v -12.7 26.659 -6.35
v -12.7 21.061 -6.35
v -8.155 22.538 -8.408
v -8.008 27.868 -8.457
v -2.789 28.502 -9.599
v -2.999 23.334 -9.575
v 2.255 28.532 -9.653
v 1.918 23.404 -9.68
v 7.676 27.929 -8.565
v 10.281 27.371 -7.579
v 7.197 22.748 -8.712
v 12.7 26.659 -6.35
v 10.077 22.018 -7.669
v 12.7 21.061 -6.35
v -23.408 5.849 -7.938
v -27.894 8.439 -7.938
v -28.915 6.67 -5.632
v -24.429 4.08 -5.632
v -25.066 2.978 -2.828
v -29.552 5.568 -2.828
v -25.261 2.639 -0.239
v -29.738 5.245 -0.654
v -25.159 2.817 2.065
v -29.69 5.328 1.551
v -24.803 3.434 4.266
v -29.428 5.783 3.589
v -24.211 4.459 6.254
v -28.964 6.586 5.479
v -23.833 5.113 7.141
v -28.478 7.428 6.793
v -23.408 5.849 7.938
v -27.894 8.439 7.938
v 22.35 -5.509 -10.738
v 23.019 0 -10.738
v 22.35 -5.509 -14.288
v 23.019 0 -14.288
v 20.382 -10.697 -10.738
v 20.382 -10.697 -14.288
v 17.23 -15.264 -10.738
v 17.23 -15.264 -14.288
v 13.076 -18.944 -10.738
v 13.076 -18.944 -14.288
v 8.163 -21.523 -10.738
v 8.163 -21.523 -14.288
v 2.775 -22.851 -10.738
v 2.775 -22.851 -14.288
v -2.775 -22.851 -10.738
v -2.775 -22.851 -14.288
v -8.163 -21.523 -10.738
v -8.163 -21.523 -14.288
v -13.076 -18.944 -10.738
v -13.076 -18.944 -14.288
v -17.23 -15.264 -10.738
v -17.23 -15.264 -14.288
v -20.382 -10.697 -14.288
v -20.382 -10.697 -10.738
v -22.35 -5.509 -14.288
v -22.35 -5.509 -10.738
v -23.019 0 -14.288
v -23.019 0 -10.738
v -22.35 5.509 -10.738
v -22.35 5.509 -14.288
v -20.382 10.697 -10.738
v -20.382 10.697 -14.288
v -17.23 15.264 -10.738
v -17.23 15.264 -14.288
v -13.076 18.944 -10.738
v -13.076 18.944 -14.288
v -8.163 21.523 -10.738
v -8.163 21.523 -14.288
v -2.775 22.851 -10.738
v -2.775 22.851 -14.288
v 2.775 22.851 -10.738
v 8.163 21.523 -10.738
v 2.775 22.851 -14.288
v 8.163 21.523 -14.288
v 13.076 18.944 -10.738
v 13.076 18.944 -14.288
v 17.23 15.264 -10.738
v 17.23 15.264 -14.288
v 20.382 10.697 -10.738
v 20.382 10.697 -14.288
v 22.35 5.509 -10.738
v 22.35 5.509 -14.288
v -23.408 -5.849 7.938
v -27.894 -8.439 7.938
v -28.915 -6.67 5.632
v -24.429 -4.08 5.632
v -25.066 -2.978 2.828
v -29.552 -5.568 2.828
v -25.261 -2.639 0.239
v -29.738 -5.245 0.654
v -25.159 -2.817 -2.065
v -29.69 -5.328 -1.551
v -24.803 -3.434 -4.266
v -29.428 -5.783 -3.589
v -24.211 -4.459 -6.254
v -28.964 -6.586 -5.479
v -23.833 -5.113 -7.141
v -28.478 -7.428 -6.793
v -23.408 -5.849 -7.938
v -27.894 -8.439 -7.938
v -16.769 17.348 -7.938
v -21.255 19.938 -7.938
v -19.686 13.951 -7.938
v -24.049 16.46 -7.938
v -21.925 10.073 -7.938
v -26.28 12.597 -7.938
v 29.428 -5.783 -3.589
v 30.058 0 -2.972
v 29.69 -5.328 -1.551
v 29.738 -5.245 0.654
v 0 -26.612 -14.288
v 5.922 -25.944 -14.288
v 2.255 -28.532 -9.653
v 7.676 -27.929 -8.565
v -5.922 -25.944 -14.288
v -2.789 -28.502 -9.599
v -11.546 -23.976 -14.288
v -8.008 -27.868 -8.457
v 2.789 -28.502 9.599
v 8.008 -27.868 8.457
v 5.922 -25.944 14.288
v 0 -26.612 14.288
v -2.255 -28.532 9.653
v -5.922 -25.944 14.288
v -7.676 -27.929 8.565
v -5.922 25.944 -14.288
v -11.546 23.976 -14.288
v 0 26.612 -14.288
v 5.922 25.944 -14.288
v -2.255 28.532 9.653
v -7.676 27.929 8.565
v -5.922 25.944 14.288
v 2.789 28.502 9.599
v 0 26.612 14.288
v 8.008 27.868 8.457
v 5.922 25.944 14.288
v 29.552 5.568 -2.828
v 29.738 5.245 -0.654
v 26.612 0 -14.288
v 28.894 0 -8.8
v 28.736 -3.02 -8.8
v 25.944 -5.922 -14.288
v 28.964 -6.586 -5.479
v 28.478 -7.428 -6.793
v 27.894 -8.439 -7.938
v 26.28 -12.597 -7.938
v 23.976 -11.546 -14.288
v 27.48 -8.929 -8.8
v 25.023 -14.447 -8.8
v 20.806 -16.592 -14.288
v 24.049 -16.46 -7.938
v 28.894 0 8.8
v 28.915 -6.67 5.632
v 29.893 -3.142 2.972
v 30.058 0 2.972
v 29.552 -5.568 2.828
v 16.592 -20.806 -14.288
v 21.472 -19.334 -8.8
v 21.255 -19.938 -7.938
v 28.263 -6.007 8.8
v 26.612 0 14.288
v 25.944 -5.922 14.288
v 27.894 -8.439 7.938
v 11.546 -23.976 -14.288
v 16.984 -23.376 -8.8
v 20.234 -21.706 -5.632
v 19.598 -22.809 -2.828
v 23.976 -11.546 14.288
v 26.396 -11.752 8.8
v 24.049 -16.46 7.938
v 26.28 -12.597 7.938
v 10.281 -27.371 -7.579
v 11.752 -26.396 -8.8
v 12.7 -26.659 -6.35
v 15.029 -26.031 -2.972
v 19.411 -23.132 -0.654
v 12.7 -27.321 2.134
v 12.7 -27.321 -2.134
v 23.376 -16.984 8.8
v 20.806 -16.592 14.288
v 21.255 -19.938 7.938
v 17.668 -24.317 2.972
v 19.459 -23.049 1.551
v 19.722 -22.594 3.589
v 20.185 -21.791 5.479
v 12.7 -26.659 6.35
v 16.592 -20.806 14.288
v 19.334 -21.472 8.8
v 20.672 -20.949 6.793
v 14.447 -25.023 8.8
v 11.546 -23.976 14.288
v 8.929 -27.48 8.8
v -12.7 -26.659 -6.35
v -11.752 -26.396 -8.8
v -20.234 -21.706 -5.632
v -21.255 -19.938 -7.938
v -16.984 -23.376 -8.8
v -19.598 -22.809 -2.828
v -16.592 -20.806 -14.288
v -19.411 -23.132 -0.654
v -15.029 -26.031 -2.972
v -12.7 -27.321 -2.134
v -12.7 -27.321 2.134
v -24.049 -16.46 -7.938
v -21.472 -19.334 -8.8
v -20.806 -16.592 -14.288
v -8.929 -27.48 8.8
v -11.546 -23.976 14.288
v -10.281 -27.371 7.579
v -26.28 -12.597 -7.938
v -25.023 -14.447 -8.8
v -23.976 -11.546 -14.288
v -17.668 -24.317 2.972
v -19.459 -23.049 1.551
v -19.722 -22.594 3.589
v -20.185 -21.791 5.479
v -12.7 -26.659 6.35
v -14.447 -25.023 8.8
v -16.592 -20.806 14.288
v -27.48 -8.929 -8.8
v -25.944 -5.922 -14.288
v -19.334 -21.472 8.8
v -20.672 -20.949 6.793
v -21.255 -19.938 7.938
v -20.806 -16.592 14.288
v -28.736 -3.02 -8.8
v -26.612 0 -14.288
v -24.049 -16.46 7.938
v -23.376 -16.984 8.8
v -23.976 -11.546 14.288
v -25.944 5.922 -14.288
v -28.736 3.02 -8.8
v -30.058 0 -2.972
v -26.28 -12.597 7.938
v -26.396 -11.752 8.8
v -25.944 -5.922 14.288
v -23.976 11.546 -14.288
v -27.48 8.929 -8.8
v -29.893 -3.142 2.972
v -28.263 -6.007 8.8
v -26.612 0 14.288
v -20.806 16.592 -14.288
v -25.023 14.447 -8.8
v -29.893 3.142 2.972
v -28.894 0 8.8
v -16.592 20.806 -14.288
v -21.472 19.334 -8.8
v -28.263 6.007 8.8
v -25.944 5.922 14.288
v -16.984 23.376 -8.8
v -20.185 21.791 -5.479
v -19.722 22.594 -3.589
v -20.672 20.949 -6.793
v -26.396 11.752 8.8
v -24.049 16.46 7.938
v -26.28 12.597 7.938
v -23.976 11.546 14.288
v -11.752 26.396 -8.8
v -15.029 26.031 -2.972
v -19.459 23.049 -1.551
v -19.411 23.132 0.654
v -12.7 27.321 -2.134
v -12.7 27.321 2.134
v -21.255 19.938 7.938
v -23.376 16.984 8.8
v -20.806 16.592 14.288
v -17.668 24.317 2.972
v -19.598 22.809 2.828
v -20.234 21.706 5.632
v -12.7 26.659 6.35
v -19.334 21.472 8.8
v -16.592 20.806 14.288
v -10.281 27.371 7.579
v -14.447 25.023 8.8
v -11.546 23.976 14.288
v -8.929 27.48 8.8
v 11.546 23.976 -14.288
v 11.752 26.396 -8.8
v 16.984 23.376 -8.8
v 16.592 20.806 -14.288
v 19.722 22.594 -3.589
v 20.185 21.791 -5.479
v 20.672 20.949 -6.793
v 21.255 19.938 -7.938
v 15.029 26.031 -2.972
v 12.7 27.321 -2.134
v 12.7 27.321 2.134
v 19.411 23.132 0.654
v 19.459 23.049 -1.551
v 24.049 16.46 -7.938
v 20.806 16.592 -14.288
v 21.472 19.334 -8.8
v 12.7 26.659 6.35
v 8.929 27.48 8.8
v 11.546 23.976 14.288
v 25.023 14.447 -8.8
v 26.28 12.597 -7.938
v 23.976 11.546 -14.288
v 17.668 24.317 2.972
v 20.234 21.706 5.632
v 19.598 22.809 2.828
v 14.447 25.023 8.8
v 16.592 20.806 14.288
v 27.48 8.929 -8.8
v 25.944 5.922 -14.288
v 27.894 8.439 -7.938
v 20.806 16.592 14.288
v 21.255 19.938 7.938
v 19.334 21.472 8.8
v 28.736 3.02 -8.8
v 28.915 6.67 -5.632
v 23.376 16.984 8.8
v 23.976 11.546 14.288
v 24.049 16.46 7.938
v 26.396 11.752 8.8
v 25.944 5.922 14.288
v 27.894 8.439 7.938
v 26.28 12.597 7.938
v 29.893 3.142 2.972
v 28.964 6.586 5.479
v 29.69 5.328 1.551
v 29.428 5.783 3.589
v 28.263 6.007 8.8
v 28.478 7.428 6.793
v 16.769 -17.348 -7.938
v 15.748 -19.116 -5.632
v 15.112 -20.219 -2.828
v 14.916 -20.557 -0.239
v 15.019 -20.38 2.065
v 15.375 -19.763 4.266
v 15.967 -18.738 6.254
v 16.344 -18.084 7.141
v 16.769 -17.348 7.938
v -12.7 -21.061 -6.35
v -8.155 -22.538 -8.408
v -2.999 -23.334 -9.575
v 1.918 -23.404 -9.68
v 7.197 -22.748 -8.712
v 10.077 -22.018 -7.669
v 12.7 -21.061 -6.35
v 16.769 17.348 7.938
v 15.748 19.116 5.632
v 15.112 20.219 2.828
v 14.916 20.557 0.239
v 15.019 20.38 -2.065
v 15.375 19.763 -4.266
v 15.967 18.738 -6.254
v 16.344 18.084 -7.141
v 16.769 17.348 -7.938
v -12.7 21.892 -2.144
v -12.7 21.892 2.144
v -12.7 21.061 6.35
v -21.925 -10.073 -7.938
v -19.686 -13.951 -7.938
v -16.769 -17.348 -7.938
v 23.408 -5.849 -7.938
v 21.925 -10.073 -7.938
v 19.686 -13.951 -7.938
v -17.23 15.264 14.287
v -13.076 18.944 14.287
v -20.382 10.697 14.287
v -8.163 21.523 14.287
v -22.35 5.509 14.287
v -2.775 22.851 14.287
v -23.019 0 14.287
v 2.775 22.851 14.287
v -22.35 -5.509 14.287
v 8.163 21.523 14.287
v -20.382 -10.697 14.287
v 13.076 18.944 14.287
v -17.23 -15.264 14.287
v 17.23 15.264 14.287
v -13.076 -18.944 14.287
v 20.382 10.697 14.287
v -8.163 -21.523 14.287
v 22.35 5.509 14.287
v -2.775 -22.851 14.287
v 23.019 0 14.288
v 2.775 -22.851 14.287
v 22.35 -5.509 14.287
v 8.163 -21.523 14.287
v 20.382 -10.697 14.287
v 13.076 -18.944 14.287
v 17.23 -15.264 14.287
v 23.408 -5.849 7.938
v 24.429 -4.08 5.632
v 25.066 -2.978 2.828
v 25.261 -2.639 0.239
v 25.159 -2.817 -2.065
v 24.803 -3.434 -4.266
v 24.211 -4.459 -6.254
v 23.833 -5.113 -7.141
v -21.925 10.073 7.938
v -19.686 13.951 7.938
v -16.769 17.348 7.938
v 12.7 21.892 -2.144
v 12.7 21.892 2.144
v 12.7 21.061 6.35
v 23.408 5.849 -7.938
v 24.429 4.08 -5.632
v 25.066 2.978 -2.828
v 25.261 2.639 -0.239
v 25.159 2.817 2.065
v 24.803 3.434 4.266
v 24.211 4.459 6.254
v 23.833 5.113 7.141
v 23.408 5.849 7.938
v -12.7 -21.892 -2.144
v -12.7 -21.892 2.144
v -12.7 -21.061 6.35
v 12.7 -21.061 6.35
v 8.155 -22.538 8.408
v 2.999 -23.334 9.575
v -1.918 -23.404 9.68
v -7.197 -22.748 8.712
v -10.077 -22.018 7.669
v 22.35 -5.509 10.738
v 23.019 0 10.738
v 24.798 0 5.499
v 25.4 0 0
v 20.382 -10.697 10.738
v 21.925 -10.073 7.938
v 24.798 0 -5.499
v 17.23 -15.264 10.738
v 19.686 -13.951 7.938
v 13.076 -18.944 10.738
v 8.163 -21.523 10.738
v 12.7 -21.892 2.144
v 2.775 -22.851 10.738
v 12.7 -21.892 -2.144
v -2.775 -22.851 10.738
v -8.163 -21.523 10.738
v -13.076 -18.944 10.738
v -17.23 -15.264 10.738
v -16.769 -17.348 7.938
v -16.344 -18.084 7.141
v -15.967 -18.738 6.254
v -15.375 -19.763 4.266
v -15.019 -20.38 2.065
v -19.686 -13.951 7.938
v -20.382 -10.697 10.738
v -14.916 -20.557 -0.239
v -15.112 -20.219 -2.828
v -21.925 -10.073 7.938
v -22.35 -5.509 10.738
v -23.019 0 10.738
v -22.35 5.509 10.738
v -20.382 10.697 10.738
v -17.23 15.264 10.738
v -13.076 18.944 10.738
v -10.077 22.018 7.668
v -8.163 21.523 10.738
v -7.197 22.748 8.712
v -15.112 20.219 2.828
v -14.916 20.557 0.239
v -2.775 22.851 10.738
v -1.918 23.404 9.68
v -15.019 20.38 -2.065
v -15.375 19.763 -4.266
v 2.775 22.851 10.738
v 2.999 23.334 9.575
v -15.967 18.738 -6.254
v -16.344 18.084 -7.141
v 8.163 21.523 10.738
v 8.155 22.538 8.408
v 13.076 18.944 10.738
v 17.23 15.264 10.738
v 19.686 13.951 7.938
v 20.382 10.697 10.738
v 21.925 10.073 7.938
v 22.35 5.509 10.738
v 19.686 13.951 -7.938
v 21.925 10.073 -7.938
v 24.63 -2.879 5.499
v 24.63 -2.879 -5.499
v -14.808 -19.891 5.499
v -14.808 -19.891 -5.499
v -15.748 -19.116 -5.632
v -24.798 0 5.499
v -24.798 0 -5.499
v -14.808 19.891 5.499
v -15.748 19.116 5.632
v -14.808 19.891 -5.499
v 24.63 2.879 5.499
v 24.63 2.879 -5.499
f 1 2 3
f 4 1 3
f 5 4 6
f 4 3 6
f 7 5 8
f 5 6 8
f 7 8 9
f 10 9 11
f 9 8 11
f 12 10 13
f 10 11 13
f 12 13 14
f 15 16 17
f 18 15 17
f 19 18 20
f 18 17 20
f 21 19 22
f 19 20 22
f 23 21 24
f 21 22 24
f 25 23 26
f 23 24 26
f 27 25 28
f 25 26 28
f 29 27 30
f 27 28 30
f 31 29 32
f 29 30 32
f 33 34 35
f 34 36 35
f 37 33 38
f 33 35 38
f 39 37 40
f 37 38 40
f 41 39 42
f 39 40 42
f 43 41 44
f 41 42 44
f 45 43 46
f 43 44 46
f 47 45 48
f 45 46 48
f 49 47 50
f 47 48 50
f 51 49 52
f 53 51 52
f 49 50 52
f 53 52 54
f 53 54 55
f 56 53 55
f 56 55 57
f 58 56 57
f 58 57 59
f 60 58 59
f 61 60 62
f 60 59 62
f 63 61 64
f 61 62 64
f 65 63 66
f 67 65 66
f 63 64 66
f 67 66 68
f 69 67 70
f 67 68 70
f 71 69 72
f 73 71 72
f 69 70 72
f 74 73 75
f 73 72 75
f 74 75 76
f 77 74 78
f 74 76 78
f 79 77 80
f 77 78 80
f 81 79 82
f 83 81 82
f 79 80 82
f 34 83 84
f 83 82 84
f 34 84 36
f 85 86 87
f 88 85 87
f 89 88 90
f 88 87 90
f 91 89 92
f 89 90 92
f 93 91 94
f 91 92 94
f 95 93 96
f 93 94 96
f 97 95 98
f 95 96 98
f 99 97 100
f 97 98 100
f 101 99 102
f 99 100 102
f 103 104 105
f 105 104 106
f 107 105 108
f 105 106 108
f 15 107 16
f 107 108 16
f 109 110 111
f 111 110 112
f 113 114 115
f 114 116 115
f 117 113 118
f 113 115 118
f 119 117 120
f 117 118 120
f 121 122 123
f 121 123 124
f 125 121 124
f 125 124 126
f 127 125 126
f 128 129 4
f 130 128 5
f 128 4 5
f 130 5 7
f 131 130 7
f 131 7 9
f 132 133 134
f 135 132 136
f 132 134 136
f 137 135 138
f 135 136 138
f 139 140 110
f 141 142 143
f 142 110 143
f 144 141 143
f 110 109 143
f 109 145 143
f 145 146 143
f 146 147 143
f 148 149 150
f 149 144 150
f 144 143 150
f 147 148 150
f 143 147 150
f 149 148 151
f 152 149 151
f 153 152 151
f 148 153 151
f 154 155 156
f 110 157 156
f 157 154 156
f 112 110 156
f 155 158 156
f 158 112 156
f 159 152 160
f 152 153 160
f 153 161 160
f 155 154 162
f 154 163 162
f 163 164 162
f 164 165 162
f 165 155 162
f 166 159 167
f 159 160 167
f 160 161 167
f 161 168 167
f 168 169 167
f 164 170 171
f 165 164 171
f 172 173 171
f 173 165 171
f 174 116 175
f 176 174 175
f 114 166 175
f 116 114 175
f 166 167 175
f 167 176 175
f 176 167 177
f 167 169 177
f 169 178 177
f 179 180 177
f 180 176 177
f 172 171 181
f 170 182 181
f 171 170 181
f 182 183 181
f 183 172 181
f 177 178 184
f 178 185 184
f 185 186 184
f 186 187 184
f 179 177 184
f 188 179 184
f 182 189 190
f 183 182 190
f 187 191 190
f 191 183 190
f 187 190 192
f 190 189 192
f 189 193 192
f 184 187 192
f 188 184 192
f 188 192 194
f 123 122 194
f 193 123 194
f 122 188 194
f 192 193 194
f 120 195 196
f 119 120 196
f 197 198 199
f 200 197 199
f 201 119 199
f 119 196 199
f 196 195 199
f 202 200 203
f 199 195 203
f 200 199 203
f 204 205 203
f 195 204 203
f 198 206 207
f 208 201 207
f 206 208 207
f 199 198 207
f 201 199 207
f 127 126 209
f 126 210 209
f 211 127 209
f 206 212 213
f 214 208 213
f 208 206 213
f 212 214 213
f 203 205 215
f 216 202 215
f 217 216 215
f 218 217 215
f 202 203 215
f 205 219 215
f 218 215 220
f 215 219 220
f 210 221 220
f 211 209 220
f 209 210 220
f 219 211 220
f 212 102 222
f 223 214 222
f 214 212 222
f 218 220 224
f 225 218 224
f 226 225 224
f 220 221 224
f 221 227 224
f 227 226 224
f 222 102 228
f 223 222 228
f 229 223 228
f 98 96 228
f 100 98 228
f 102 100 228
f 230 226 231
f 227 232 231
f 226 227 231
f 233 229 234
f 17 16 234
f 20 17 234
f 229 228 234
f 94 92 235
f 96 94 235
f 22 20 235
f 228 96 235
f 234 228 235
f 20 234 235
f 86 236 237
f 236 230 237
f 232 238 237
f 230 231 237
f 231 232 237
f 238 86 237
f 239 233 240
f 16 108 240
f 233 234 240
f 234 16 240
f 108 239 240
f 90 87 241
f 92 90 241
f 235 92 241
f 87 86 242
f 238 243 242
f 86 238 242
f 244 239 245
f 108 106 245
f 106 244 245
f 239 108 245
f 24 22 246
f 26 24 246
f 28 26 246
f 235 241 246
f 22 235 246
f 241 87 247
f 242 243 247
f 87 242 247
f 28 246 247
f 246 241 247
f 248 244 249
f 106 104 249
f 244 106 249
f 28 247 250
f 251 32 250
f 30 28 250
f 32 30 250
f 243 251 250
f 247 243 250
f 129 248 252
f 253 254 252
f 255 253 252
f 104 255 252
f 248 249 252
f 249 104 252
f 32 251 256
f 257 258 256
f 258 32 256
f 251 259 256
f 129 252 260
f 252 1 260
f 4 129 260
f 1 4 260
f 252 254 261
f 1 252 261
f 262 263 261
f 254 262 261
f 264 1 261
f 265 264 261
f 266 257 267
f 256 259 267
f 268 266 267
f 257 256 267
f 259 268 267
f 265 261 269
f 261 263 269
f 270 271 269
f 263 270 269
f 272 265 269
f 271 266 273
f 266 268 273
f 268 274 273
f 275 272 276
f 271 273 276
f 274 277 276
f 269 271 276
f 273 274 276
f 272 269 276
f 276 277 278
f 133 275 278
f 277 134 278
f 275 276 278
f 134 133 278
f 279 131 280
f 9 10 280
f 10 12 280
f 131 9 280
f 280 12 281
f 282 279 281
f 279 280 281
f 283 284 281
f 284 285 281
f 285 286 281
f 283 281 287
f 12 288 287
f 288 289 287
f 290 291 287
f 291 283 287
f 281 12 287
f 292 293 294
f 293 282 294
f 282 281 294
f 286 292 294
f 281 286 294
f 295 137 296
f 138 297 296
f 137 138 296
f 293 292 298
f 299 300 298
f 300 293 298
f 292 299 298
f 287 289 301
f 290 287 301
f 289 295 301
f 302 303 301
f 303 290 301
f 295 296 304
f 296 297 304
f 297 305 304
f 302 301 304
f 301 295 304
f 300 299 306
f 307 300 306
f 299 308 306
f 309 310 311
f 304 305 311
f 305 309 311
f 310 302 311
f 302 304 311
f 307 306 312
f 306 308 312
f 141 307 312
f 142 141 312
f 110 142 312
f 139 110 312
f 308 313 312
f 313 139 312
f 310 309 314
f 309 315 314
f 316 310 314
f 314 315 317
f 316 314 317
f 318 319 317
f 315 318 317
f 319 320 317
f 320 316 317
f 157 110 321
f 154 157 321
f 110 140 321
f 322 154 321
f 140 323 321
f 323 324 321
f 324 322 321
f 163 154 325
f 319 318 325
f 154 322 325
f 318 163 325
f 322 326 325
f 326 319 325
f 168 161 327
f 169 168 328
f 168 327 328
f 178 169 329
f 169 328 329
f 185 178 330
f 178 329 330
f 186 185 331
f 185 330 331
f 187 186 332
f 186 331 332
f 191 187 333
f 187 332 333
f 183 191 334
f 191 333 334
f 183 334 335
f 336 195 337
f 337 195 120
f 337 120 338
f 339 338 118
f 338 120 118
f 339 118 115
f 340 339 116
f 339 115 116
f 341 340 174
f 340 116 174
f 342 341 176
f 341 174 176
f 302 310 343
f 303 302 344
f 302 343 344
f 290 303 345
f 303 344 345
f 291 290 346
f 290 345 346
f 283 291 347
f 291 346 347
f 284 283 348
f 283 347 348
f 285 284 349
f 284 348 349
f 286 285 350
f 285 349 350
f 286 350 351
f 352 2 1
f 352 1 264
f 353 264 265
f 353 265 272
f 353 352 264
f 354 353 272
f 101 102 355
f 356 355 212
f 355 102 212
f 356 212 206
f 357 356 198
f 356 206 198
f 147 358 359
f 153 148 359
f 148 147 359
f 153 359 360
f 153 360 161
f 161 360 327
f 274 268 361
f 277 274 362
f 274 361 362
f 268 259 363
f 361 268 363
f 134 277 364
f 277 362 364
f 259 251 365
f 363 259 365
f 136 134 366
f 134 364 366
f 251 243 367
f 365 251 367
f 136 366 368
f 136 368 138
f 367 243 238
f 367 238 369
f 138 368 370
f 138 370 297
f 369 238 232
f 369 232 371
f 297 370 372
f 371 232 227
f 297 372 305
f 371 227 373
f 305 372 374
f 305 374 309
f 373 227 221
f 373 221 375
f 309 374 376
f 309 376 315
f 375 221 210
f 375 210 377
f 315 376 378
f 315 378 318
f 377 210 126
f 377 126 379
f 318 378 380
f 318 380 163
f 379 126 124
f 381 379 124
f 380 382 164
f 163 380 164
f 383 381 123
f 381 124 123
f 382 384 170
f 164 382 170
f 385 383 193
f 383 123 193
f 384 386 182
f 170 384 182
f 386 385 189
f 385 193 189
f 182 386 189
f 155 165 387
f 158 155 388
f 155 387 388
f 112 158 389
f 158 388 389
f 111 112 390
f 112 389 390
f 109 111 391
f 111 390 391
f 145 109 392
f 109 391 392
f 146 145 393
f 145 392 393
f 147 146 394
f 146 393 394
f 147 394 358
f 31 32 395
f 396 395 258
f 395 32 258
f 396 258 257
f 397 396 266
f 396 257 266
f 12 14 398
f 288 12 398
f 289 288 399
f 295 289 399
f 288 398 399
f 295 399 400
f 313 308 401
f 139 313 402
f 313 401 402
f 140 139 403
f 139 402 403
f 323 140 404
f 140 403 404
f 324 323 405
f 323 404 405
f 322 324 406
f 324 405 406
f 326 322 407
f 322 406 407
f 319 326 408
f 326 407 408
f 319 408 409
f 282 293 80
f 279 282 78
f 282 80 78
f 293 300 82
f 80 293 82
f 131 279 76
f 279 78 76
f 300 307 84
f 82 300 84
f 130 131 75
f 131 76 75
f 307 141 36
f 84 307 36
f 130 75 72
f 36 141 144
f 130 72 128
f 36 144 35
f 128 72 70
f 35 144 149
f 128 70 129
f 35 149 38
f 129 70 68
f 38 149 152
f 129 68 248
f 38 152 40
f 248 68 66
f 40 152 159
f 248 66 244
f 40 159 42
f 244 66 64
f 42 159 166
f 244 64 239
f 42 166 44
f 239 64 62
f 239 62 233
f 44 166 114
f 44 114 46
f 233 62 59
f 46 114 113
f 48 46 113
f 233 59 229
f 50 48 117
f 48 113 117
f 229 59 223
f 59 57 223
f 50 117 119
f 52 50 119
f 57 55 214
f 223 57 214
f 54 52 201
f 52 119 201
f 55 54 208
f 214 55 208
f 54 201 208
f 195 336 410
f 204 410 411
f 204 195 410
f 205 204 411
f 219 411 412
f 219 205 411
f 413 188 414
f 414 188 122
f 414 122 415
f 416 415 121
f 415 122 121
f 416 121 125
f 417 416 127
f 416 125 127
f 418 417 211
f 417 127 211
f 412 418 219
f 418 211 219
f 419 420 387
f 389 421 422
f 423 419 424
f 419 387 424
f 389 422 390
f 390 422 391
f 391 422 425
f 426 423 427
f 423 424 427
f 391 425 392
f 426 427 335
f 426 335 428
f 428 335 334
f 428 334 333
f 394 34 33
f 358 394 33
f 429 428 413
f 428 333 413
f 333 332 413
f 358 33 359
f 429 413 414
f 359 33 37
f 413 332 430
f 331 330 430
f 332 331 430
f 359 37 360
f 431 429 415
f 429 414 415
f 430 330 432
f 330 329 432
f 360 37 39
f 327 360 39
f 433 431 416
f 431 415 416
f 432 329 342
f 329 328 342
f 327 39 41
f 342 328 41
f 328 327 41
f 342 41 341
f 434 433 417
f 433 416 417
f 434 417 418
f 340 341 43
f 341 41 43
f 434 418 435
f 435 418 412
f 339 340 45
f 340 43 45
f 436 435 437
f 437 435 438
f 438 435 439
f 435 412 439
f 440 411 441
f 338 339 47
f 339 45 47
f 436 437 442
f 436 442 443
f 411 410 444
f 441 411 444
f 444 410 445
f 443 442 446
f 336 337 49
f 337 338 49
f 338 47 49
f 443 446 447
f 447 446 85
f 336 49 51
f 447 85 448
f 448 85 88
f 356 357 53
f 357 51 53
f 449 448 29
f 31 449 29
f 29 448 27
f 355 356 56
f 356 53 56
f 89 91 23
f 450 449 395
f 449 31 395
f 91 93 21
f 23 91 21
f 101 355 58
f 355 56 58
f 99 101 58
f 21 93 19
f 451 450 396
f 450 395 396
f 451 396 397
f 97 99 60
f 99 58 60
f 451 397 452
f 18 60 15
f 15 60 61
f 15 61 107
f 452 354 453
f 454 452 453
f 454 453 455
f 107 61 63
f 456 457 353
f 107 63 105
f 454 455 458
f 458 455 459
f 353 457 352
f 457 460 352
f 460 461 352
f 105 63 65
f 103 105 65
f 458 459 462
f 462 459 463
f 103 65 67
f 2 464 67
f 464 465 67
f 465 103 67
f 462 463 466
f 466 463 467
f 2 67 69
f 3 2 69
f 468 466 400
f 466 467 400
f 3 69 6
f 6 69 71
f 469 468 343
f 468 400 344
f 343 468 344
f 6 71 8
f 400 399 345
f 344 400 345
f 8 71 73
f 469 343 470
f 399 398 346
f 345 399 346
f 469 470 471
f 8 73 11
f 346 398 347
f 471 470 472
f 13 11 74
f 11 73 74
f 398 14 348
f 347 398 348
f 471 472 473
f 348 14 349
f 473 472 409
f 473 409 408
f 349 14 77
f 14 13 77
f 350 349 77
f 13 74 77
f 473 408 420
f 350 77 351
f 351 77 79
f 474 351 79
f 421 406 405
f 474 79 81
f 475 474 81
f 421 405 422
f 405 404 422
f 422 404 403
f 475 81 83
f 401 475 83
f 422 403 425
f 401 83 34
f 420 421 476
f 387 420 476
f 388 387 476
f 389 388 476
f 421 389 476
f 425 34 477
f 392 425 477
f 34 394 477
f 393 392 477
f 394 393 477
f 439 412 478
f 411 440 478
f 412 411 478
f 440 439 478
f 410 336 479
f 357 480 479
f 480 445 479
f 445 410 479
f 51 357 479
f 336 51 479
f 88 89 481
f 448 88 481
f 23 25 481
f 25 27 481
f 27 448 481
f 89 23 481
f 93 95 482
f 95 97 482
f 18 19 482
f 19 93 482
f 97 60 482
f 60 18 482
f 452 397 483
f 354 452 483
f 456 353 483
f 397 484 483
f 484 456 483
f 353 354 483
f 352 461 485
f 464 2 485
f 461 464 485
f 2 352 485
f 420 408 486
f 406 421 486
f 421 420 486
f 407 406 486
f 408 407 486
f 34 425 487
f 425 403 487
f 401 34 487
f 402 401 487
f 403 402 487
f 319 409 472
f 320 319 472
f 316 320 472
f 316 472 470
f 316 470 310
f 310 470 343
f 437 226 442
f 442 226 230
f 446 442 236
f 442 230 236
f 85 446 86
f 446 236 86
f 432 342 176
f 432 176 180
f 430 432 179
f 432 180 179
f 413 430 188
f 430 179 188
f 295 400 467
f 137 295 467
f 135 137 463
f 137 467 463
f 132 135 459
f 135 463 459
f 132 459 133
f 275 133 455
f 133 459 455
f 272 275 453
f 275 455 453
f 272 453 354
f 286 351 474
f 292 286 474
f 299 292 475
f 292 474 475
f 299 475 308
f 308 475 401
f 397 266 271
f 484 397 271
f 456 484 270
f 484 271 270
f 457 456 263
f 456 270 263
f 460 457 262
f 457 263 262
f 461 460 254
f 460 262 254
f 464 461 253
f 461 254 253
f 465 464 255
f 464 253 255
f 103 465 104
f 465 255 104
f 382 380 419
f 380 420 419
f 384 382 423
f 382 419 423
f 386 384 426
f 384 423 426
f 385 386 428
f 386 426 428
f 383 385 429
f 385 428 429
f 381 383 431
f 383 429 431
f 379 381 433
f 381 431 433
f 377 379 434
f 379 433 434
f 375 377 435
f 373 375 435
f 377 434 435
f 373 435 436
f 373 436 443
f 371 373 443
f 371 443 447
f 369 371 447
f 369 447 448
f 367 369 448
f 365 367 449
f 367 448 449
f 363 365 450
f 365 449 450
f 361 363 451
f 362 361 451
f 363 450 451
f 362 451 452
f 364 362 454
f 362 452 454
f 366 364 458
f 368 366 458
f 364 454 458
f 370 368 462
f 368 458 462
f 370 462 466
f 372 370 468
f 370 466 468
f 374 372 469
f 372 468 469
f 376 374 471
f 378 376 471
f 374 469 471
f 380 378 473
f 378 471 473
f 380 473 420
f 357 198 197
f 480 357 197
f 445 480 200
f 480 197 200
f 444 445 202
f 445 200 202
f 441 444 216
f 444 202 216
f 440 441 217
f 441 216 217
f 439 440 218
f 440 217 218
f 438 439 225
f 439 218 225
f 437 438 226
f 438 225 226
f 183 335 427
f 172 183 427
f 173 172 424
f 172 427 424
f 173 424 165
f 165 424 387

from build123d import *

# Parameters (mm, degrees)
F3_W      = 25.4
F3_H      = 12.7
F4_DEPTH  = 72.39
F7_DEPTH  = 53.086
F10_DEPTH = 47.244


# Not quite as in the source:
# - a feature names something its author has since deleted; it is built from what else it names


with BuildPart() as f1:
    # F0 (on Front) → F1 (revolve)
    with BuildSketch(Plane.XZ):
        with BuildLine():
            ThreePointArc((23.01875, 10.7376509739), (25.4, 0), (23.01875, -10.7376509739))
            Line((23.01875, -10.7376509739), (23.01875, -14.2875))
            Line((23.01875, -14.2875), (26.611533725, -14.2875))
            ThreePointArc((26.611533725, -14.2875), (30.20441, 0), (26.611533725, 14.2875))
            Line((26.611533725, 14.2875), (23.01875, 14.2875))
            Line((23.01875, 14.2875), (23.01875, 10.7376509739))
        make_face()
    revolve(axis=Axis((0, 0, -4.5421977431), (0, 0, -1)))

    # F3 (on offset) → F4 (cut)
    with BuildSketch(Plane.XZ.offset(30.20441)):
        with BuildLine():
            ThreePointArc((12.7, 6.35), (0, 9.7529547439), (-12.7, 6.35))
            Line((-12.7, 6.35), (12.7, 6.35))
        make_face()
        Rectangle(F3_W, F3_H)
        with BuildLine():
            Line((12.7, -6.35), (-12.7, -6.35))
            ThreePointArc((-12.7, -6.35), (0, -9.7529547439), (12.7, -6.35))
        make_face()
    extrude(amount=-F4_DEPTH, mode=Mode.SUBTRACT)

    # F6 (on line) → F7 (cut, symmetric)
    with BuildSketch(Plane(origin=(0, 0, 0), x_dir=(0.5, -0.8660254038, 0), z_dir=(-0.8660254038, -0.5, 0))):
        with BuildLine():
            ThreePointArc((6.6390036837, -7.9375), (10.34796, 0), (6.6390036837, 7.9375))
            Line((6.6390036837, 7.9375), (-6.6390036837, 7.9375))
            ThreePointArc((-6.6390036837, 7.9375), (-10.34796, 0), (-6.6390036837, -7.9375))
            Line((-6.6390036837, -7.9375), (6.6390036837, -7.9375))
        make_face()
    extrude(amount=F7_DEPTH, both=True, mode=Mode.SUBTRACT)

    # F9 (on line) → F10 (cut, symmetric)
    with BuildSketch(Plane(origin=(0, 0, 0), x_dir=(-0.5, -0.8660254038, 0), z_dir=(-0.8660254038, 0.5, 0))):
        with BuildLine():
            ThreePointArc((6.6390036837, -7.9375), (10.34796, 0), (6.6390036837, 7.9375))
            Line((6.6390036837, 7.9375), (-6.6390036837, 7.9375))
            ThreePointArc((-6.6390036837, 7.9375), (-10.34796, 0), (-6.6390036837, -7.9375))
            Line((-6.6390036837, -7.9375), (6.6390036837, -7.9375))
        make_face()
    extrude(amount=F10_DEPTH, both=True, mode=Mode.SUBTRACT)


solid = f1.part
